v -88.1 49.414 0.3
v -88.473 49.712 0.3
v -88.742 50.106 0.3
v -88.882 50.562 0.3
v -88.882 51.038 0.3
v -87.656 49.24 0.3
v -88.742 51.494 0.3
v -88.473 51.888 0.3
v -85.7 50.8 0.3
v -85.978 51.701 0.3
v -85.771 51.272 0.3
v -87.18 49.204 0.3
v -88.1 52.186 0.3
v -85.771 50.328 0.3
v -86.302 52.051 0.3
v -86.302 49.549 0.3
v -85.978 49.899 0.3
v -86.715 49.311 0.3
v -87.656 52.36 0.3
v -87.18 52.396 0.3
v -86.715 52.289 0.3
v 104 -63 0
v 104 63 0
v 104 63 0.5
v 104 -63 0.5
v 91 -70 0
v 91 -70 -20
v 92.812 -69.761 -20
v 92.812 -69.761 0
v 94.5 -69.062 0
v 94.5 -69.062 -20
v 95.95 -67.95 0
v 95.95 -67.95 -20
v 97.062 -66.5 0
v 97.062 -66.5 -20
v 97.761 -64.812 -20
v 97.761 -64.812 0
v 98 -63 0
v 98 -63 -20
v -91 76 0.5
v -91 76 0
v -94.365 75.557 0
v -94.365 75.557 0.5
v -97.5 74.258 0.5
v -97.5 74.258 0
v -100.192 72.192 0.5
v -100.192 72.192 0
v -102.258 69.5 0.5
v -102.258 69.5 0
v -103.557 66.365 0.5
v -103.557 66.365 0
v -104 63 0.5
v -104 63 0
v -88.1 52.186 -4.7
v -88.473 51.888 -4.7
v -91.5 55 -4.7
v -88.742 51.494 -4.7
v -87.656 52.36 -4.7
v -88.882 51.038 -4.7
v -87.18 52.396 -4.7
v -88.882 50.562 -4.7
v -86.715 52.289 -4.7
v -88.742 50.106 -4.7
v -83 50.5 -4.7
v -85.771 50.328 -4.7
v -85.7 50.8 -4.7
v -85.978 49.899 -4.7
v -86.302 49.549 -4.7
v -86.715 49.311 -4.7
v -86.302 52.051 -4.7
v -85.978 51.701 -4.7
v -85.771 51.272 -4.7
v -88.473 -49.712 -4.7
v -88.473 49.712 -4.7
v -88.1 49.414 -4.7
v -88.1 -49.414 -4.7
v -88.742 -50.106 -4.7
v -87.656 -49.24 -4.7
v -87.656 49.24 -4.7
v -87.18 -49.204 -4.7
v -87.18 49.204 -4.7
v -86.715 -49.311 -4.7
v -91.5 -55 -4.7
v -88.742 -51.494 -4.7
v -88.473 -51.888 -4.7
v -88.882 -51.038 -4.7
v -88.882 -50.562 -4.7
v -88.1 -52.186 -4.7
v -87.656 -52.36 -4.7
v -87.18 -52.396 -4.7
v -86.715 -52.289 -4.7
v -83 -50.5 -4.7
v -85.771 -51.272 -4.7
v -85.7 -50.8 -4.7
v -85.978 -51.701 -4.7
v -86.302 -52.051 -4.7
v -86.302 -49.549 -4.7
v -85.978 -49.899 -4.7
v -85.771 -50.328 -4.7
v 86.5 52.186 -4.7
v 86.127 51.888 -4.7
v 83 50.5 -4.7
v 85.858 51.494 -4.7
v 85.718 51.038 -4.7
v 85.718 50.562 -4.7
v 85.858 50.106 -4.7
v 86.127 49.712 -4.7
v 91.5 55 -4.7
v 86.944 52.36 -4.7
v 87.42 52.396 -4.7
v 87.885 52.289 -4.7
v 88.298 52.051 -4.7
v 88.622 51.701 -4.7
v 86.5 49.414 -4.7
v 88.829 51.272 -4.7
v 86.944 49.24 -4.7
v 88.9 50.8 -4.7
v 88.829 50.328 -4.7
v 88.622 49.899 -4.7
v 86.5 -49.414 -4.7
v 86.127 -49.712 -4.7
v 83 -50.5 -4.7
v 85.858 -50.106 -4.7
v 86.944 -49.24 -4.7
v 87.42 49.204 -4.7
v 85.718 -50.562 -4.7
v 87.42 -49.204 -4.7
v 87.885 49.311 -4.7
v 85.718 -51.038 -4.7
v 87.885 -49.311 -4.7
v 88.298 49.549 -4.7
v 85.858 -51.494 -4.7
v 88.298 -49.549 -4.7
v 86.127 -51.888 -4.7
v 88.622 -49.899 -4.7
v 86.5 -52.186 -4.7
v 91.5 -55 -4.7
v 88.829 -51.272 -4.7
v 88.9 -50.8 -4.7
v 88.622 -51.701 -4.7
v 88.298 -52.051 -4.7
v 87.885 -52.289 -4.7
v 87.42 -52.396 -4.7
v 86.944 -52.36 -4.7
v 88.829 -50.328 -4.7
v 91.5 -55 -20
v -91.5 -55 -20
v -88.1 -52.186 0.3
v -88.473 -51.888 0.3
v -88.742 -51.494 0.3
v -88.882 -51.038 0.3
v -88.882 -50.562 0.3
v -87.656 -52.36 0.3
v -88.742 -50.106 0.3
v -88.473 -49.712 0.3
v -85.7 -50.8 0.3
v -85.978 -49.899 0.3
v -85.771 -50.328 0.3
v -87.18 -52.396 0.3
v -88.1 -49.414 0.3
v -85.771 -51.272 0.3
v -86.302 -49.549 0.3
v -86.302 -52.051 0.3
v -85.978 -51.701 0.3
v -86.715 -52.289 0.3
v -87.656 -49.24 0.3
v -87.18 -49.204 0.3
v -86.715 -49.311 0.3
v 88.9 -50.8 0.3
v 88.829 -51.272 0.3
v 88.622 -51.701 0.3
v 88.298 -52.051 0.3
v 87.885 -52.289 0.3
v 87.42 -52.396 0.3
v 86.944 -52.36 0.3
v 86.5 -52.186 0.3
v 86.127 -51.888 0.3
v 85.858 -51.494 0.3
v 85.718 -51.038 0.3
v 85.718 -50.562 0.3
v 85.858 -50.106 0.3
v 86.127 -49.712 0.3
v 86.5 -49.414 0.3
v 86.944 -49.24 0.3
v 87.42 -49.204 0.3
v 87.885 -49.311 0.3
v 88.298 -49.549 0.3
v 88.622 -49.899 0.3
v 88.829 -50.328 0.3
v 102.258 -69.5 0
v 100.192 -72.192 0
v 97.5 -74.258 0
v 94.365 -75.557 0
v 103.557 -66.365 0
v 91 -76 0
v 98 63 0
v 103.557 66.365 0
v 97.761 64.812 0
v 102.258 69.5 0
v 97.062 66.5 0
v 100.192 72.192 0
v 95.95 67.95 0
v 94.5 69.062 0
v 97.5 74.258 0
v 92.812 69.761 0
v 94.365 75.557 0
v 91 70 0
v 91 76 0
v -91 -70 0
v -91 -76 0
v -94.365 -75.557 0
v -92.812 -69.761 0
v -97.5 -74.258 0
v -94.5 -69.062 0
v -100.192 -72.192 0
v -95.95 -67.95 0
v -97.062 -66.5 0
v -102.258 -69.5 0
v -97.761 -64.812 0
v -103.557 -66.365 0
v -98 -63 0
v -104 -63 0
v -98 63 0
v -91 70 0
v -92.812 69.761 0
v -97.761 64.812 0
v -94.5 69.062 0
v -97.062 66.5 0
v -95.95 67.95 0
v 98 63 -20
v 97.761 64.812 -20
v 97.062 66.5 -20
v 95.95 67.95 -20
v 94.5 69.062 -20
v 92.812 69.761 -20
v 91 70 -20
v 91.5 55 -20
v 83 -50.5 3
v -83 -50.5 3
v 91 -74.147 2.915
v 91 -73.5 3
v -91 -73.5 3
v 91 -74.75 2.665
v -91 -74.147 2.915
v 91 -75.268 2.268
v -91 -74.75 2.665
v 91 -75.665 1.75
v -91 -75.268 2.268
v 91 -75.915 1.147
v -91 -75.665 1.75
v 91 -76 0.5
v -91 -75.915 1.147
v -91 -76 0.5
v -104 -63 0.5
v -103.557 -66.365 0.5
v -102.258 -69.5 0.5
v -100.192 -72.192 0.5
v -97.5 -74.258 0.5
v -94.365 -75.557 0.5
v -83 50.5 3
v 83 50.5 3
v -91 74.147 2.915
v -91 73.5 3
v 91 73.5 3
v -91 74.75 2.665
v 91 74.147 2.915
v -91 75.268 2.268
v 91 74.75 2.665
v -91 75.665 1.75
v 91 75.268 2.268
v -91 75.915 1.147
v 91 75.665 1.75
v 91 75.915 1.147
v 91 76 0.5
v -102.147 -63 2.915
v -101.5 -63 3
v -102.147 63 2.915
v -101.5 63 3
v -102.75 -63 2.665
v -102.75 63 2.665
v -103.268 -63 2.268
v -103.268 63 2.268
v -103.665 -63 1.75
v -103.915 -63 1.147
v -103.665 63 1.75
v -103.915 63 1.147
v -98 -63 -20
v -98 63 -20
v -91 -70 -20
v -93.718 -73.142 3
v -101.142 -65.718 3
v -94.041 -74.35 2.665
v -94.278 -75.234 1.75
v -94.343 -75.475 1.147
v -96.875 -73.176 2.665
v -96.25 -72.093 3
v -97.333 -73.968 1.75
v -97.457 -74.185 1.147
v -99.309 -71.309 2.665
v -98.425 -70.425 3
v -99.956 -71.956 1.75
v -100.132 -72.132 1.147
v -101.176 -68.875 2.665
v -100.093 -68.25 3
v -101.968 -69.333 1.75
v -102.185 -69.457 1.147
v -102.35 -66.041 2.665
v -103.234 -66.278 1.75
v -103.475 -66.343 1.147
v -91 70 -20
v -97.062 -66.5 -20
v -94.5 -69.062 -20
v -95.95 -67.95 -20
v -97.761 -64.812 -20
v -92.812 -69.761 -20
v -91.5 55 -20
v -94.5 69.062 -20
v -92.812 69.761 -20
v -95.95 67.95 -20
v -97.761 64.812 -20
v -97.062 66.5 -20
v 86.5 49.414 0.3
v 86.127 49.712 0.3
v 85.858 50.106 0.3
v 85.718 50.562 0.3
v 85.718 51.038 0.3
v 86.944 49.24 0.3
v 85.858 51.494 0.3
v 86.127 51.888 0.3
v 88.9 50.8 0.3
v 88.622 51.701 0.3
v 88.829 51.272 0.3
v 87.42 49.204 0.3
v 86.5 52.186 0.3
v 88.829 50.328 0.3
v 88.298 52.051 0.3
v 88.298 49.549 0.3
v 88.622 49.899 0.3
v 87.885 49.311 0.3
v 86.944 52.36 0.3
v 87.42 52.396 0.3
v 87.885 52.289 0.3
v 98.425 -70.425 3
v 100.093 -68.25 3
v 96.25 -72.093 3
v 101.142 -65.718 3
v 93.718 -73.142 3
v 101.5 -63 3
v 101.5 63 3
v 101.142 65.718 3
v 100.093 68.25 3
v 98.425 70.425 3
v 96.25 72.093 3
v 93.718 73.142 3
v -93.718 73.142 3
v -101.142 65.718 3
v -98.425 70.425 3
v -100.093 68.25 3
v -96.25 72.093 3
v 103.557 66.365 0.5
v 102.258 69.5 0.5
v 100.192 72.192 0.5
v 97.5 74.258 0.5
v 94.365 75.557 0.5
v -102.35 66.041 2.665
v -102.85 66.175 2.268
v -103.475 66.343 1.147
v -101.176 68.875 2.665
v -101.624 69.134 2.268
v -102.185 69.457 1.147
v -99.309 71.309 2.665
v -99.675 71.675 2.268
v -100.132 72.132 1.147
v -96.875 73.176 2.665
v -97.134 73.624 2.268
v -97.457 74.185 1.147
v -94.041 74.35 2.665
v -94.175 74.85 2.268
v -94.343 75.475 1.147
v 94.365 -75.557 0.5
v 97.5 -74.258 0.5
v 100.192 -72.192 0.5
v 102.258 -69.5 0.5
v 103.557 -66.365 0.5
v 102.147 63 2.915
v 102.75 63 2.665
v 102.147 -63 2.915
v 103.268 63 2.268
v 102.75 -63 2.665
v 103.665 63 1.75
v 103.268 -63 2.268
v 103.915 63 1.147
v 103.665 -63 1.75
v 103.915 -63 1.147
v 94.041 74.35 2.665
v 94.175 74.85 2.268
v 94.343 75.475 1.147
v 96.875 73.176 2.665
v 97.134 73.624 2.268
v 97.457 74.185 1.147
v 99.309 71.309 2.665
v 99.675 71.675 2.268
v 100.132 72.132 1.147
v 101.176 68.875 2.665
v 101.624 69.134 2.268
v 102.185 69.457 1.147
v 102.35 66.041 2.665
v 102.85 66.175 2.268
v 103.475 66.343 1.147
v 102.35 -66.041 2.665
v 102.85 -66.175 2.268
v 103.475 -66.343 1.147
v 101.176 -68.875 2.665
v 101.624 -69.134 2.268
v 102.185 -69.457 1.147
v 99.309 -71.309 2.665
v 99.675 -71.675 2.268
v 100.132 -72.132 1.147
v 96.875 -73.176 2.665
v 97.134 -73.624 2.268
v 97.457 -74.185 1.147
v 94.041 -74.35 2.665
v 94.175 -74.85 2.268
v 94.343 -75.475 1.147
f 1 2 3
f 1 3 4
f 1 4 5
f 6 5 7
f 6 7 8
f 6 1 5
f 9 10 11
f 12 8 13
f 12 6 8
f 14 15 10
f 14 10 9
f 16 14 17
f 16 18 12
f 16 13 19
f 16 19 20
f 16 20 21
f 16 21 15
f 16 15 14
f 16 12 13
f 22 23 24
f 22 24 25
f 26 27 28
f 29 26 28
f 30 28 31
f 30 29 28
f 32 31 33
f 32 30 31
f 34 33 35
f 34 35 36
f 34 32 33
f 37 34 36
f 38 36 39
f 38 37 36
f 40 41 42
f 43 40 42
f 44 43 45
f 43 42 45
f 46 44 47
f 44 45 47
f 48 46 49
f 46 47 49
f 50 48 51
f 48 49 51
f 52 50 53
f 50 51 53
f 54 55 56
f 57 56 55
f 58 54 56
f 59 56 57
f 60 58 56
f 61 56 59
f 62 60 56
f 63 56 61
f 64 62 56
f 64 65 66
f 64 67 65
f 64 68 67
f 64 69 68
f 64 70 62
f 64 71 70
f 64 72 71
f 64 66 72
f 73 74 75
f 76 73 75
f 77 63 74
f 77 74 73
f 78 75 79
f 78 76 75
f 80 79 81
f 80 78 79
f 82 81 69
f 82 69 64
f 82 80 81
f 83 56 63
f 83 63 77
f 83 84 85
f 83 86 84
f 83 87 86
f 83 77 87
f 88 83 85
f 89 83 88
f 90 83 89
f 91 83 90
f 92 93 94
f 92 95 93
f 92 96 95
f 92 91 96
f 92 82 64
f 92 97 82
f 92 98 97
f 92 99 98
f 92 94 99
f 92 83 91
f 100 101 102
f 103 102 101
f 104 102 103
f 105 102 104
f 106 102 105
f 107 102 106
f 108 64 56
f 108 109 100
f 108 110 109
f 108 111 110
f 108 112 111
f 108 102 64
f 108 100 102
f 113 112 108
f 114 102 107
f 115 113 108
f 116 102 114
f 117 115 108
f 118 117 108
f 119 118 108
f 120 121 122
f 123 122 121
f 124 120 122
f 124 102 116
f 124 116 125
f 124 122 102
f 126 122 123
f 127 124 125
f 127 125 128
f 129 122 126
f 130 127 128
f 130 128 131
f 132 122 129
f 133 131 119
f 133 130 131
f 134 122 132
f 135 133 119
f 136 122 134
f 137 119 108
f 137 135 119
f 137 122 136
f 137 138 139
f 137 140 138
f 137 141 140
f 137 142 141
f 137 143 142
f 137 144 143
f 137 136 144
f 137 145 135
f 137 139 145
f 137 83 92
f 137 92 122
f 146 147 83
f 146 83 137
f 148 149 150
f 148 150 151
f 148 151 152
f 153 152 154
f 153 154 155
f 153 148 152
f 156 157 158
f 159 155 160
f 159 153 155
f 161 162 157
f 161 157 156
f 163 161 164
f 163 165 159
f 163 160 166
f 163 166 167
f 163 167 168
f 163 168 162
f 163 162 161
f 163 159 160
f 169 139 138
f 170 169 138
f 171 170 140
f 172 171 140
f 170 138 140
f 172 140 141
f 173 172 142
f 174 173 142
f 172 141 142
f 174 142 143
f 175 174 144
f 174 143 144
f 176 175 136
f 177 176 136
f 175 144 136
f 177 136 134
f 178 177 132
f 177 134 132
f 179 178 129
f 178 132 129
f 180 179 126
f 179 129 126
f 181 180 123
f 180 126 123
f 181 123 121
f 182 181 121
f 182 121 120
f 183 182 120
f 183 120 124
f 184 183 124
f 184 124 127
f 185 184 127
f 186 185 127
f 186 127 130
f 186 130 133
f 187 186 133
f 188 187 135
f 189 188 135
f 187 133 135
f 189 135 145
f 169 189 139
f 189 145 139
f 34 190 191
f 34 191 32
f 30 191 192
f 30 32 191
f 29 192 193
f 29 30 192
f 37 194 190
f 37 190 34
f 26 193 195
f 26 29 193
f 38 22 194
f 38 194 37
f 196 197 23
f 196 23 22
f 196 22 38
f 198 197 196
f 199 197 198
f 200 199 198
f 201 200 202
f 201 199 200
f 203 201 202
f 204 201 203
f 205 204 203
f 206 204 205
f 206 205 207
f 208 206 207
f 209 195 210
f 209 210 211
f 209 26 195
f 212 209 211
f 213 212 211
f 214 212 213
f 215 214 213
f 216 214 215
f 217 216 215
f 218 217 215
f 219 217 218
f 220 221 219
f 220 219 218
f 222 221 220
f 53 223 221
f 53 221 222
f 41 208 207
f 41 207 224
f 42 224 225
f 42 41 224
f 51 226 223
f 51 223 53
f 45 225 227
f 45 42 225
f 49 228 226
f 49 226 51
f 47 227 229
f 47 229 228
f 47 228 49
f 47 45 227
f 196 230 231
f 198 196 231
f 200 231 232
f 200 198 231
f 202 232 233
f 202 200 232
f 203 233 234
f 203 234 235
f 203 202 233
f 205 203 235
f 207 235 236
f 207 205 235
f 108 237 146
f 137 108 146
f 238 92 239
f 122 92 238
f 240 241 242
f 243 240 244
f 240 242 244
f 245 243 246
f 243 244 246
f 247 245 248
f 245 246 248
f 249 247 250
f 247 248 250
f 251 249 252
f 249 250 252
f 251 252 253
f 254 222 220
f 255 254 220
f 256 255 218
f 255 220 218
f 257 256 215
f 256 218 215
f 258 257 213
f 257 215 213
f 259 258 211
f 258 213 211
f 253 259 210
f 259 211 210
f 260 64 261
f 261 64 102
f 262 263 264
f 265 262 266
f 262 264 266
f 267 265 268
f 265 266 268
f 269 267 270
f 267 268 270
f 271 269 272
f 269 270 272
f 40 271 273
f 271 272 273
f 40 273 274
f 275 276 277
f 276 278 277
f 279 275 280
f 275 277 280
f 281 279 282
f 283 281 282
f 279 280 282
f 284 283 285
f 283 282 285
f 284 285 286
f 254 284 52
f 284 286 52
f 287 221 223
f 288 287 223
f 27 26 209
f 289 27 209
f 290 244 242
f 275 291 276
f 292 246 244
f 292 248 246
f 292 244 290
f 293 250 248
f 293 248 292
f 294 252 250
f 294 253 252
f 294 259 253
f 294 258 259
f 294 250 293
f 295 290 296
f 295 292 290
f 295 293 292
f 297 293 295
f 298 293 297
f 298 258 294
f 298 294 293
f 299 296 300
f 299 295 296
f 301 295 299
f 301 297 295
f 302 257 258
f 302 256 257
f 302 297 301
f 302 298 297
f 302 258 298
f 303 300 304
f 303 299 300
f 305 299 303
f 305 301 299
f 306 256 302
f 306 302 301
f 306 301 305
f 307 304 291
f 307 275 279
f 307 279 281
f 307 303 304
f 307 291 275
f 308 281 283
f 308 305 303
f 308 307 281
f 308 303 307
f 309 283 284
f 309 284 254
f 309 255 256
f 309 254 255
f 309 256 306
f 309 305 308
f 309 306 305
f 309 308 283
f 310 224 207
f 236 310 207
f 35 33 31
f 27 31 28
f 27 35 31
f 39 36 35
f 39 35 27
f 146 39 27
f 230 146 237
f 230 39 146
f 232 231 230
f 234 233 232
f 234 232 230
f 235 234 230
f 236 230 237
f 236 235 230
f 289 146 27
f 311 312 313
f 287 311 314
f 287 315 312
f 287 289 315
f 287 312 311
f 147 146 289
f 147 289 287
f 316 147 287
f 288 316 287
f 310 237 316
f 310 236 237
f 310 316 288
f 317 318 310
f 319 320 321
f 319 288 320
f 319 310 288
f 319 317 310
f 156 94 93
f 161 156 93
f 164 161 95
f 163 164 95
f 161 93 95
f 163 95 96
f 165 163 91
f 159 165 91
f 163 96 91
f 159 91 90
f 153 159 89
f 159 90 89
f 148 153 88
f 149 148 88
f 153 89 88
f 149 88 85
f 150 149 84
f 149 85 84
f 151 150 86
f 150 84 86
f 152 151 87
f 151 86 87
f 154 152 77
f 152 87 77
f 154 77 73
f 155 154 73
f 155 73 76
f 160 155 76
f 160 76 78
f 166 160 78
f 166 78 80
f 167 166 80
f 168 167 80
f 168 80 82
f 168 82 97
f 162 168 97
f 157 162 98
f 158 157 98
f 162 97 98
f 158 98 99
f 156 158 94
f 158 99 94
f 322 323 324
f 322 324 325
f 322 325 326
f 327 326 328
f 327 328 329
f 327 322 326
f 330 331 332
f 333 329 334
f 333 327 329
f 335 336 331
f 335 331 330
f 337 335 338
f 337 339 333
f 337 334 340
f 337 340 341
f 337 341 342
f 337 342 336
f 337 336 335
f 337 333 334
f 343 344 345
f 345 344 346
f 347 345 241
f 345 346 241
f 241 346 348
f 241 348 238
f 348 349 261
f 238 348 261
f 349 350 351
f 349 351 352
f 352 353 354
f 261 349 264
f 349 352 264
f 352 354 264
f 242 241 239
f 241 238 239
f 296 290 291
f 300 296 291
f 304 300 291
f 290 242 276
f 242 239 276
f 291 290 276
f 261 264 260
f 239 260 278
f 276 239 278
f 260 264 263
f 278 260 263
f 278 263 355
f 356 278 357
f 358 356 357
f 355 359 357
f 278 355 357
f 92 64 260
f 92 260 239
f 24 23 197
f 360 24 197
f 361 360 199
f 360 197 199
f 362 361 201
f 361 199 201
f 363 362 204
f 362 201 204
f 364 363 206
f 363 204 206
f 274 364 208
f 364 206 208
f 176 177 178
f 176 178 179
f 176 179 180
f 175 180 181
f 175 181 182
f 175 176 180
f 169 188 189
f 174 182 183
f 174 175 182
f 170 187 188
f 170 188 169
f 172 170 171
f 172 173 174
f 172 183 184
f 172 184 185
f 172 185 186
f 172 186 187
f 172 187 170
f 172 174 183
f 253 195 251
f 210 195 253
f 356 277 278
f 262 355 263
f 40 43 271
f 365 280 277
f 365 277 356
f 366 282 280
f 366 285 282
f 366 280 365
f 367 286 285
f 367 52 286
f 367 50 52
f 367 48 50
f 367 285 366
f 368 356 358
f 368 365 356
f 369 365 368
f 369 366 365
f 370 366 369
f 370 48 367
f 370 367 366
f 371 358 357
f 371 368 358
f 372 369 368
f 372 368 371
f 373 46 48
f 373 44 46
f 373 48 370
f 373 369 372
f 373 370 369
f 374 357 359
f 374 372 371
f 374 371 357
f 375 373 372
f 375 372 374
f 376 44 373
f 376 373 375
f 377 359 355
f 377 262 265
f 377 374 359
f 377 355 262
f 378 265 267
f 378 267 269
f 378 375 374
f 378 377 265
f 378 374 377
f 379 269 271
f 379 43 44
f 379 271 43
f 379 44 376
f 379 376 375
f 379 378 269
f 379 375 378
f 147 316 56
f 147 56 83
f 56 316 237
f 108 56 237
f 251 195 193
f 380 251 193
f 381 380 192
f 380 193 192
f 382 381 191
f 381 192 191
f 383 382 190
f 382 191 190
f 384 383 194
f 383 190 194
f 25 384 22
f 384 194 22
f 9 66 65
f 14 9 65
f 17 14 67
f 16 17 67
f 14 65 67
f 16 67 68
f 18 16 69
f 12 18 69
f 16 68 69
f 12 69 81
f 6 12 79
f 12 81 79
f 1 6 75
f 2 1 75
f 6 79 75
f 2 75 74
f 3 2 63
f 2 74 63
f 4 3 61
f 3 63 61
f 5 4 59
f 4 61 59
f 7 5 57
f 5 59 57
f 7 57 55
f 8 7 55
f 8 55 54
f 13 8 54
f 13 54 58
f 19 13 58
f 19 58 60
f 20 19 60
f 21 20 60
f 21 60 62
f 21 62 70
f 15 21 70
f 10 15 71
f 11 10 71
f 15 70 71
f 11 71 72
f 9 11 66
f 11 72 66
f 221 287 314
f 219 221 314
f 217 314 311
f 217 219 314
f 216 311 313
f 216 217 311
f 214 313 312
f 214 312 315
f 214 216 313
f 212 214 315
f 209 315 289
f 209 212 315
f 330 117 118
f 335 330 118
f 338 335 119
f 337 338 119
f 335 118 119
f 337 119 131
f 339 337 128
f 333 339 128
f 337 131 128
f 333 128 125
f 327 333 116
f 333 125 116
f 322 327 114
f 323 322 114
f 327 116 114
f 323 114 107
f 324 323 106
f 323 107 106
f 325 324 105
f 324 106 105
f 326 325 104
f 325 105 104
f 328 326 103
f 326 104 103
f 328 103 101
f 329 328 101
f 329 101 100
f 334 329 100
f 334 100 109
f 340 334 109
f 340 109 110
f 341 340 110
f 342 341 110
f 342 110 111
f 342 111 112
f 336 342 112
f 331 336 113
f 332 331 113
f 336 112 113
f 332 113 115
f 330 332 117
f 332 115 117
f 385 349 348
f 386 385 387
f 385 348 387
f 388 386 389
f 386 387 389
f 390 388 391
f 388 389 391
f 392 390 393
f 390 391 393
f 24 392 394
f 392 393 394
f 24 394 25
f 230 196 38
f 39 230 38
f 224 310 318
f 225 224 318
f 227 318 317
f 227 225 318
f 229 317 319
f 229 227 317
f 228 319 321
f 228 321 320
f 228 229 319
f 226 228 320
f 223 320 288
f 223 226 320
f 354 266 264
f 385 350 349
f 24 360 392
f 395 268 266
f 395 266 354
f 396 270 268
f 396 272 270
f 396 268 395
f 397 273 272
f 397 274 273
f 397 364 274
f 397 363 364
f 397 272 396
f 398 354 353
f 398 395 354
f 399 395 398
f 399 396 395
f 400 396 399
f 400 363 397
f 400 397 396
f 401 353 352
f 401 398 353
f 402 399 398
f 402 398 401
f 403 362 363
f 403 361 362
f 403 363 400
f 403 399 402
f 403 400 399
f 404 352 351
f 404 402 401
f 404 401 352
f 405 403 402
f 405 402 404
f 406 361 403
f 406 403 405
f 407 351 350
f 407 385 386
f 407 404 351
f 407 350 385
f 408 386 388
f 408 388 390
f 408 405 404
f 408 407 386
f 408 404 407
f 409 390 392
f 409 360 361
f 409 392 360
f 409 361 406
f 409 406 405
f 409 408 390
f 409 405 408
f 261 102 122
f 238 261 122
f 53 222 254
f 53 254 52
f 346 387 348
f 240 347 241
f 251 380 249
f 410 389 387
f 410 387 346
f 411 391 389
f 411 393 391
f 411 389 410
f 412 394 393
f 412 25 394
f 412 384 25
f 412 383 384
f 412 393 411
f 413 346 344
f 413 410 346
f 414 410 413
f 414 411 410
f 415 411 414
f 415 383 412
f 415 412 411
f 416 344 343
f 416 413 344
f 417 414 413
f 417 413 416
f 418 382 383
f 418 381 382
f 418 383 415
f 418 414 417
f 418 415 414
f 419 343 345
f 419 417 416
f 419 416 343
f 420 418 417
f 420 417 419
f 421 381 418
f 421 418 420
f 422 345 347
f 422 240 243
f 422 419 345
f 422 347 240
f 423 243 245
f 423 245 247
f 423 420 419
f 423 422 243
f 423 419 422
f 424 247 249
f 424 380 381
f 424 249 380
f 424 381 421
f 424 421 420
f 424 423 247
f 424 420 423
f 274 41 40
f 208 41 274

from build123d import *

# Parameters (mm, degrees)
PAD001_DEPTH    = 3
PAD002_DEPTH    = 20
FILLET_R        = 2.5
SKETCH005_W     = 166
SKETCH005_H     = 101
POCKET001_DEPTH = 23.001
SKETCH006_W     = 183
SKETCH006_H     = 110
POCKET002_DEPTH = 15.3
SKETCH007_R     = 1.6
POCKET003_DEPTH = 5


with BuildPart() as part:
    # Sketch002 → Pad001 (new body)
    with BuildSketch(Plane.XY):
        with BuildLine():
            Line((-91, 76), (91, 76))
            ThreePointArc((104, 63), (100.192388, 72.192388), (91, 76))
            Line((104, 63), (104, -63))
            ThreePointArc((91, -76), (100.192388, -72.192388), (104, -63))
            Line((91, -76), (-91, -76))
            ThreePointArc((-104, -63), (-100.192388, -72.192388), (-91, -76))
            Line((-104, -63), (-104, 63))
            ThreePointArc((-91, 76), (-100.192388, 72.192388), (-104, 63))
        make_face()
    extrude(amount=PAD001_DEPTH)

    # Sketch004 → Pad002 (join)
    with BuildSketch(Plane.XY):
        with BuildLine():
            Line((-91, 70), (91, 70))
            ThreePointArc((98, 63), (95.949747, 67.949747), (91, 70))
            Line((98, 63), (98, -63))
            ThreePointArc((91, -70), (95.949747, -67.949747), (98, -63))
            Line((91, -70), (-91, -70))
            ThreePointArc((-98, -63), (-95.949747, -67.949747), (-91, -70))
            Line((-98, -63), (-98, 63))
            ThreePointArc((-91, 70), (-95.949747, 67.949747), (-98, 63))
        make_face()
    extrude(amount=-PAD002_DEPTH)

    # Fillet
    fillet_edges = [part.edges().sort_by_distance(p)[0] for p in [
        (-104, 0, 3),
        (-100.192388, 72.192388, 3),
        (0, 76, 3),
        (100.192388, 72.192388, 3),
        (104, 0, 3),
        (100.192388, -72.192388, 3),
        (0, -76, 3),
        (-100.192388, -72.192388, 3),
    ]]
    fillet(fillet_edges, radius=FILLET_R)

    # Sketch005 (on Face19 of Pad002) → Pocket001 (cut, through all)
    with BuildSketch(Plane(origin=(0, 0, -20), x_dir=(1, 0, 0), z_dir=(0, 0, -1))):
        Rectangle(SKETCH005_W, SKETCH005_H)
    extrude(amount=-POCKET001_DEPTH, mode=Mode.SUBTRACT)

    # Sketch006 (on Face31 of Pocket001) → Pocket002 (cut)
    with BuildSketch(Plane(origin=(0, 0, -20), x_dir=(1, 0, 0), z_dir=(0, 0, -1))):
        Rectangle(SKETCH006_W, SKETCH006_H)
    extrude(amount=-POCKET002_DEPTH, mode=Mode.SUBTRACT)

    # Sketch007 (on Face32 of Pocket002) → Pocket003 (cut)
    with BuildSketch(Plane(origin=(0, 0, -4.7), x_dir=(1, 0, 0), z_dir=(0, 0, -1))):
        with Locations((-87.3, 50.8)):
            Circle(SKETCH007_R)
        with Locations((87.3, 50.8)):
            Circle(SKETCH007_R)
        with Locations((87.3, -50.8)):
            Circle(SKETCH007_R)
        with Locations((-87.3, -50.8)):
            Circle(SKETCH007_R)
    extrude(amount=-POCKET003_DEPTH, mode=Mode.SUBTRACT)


solid = part.part
